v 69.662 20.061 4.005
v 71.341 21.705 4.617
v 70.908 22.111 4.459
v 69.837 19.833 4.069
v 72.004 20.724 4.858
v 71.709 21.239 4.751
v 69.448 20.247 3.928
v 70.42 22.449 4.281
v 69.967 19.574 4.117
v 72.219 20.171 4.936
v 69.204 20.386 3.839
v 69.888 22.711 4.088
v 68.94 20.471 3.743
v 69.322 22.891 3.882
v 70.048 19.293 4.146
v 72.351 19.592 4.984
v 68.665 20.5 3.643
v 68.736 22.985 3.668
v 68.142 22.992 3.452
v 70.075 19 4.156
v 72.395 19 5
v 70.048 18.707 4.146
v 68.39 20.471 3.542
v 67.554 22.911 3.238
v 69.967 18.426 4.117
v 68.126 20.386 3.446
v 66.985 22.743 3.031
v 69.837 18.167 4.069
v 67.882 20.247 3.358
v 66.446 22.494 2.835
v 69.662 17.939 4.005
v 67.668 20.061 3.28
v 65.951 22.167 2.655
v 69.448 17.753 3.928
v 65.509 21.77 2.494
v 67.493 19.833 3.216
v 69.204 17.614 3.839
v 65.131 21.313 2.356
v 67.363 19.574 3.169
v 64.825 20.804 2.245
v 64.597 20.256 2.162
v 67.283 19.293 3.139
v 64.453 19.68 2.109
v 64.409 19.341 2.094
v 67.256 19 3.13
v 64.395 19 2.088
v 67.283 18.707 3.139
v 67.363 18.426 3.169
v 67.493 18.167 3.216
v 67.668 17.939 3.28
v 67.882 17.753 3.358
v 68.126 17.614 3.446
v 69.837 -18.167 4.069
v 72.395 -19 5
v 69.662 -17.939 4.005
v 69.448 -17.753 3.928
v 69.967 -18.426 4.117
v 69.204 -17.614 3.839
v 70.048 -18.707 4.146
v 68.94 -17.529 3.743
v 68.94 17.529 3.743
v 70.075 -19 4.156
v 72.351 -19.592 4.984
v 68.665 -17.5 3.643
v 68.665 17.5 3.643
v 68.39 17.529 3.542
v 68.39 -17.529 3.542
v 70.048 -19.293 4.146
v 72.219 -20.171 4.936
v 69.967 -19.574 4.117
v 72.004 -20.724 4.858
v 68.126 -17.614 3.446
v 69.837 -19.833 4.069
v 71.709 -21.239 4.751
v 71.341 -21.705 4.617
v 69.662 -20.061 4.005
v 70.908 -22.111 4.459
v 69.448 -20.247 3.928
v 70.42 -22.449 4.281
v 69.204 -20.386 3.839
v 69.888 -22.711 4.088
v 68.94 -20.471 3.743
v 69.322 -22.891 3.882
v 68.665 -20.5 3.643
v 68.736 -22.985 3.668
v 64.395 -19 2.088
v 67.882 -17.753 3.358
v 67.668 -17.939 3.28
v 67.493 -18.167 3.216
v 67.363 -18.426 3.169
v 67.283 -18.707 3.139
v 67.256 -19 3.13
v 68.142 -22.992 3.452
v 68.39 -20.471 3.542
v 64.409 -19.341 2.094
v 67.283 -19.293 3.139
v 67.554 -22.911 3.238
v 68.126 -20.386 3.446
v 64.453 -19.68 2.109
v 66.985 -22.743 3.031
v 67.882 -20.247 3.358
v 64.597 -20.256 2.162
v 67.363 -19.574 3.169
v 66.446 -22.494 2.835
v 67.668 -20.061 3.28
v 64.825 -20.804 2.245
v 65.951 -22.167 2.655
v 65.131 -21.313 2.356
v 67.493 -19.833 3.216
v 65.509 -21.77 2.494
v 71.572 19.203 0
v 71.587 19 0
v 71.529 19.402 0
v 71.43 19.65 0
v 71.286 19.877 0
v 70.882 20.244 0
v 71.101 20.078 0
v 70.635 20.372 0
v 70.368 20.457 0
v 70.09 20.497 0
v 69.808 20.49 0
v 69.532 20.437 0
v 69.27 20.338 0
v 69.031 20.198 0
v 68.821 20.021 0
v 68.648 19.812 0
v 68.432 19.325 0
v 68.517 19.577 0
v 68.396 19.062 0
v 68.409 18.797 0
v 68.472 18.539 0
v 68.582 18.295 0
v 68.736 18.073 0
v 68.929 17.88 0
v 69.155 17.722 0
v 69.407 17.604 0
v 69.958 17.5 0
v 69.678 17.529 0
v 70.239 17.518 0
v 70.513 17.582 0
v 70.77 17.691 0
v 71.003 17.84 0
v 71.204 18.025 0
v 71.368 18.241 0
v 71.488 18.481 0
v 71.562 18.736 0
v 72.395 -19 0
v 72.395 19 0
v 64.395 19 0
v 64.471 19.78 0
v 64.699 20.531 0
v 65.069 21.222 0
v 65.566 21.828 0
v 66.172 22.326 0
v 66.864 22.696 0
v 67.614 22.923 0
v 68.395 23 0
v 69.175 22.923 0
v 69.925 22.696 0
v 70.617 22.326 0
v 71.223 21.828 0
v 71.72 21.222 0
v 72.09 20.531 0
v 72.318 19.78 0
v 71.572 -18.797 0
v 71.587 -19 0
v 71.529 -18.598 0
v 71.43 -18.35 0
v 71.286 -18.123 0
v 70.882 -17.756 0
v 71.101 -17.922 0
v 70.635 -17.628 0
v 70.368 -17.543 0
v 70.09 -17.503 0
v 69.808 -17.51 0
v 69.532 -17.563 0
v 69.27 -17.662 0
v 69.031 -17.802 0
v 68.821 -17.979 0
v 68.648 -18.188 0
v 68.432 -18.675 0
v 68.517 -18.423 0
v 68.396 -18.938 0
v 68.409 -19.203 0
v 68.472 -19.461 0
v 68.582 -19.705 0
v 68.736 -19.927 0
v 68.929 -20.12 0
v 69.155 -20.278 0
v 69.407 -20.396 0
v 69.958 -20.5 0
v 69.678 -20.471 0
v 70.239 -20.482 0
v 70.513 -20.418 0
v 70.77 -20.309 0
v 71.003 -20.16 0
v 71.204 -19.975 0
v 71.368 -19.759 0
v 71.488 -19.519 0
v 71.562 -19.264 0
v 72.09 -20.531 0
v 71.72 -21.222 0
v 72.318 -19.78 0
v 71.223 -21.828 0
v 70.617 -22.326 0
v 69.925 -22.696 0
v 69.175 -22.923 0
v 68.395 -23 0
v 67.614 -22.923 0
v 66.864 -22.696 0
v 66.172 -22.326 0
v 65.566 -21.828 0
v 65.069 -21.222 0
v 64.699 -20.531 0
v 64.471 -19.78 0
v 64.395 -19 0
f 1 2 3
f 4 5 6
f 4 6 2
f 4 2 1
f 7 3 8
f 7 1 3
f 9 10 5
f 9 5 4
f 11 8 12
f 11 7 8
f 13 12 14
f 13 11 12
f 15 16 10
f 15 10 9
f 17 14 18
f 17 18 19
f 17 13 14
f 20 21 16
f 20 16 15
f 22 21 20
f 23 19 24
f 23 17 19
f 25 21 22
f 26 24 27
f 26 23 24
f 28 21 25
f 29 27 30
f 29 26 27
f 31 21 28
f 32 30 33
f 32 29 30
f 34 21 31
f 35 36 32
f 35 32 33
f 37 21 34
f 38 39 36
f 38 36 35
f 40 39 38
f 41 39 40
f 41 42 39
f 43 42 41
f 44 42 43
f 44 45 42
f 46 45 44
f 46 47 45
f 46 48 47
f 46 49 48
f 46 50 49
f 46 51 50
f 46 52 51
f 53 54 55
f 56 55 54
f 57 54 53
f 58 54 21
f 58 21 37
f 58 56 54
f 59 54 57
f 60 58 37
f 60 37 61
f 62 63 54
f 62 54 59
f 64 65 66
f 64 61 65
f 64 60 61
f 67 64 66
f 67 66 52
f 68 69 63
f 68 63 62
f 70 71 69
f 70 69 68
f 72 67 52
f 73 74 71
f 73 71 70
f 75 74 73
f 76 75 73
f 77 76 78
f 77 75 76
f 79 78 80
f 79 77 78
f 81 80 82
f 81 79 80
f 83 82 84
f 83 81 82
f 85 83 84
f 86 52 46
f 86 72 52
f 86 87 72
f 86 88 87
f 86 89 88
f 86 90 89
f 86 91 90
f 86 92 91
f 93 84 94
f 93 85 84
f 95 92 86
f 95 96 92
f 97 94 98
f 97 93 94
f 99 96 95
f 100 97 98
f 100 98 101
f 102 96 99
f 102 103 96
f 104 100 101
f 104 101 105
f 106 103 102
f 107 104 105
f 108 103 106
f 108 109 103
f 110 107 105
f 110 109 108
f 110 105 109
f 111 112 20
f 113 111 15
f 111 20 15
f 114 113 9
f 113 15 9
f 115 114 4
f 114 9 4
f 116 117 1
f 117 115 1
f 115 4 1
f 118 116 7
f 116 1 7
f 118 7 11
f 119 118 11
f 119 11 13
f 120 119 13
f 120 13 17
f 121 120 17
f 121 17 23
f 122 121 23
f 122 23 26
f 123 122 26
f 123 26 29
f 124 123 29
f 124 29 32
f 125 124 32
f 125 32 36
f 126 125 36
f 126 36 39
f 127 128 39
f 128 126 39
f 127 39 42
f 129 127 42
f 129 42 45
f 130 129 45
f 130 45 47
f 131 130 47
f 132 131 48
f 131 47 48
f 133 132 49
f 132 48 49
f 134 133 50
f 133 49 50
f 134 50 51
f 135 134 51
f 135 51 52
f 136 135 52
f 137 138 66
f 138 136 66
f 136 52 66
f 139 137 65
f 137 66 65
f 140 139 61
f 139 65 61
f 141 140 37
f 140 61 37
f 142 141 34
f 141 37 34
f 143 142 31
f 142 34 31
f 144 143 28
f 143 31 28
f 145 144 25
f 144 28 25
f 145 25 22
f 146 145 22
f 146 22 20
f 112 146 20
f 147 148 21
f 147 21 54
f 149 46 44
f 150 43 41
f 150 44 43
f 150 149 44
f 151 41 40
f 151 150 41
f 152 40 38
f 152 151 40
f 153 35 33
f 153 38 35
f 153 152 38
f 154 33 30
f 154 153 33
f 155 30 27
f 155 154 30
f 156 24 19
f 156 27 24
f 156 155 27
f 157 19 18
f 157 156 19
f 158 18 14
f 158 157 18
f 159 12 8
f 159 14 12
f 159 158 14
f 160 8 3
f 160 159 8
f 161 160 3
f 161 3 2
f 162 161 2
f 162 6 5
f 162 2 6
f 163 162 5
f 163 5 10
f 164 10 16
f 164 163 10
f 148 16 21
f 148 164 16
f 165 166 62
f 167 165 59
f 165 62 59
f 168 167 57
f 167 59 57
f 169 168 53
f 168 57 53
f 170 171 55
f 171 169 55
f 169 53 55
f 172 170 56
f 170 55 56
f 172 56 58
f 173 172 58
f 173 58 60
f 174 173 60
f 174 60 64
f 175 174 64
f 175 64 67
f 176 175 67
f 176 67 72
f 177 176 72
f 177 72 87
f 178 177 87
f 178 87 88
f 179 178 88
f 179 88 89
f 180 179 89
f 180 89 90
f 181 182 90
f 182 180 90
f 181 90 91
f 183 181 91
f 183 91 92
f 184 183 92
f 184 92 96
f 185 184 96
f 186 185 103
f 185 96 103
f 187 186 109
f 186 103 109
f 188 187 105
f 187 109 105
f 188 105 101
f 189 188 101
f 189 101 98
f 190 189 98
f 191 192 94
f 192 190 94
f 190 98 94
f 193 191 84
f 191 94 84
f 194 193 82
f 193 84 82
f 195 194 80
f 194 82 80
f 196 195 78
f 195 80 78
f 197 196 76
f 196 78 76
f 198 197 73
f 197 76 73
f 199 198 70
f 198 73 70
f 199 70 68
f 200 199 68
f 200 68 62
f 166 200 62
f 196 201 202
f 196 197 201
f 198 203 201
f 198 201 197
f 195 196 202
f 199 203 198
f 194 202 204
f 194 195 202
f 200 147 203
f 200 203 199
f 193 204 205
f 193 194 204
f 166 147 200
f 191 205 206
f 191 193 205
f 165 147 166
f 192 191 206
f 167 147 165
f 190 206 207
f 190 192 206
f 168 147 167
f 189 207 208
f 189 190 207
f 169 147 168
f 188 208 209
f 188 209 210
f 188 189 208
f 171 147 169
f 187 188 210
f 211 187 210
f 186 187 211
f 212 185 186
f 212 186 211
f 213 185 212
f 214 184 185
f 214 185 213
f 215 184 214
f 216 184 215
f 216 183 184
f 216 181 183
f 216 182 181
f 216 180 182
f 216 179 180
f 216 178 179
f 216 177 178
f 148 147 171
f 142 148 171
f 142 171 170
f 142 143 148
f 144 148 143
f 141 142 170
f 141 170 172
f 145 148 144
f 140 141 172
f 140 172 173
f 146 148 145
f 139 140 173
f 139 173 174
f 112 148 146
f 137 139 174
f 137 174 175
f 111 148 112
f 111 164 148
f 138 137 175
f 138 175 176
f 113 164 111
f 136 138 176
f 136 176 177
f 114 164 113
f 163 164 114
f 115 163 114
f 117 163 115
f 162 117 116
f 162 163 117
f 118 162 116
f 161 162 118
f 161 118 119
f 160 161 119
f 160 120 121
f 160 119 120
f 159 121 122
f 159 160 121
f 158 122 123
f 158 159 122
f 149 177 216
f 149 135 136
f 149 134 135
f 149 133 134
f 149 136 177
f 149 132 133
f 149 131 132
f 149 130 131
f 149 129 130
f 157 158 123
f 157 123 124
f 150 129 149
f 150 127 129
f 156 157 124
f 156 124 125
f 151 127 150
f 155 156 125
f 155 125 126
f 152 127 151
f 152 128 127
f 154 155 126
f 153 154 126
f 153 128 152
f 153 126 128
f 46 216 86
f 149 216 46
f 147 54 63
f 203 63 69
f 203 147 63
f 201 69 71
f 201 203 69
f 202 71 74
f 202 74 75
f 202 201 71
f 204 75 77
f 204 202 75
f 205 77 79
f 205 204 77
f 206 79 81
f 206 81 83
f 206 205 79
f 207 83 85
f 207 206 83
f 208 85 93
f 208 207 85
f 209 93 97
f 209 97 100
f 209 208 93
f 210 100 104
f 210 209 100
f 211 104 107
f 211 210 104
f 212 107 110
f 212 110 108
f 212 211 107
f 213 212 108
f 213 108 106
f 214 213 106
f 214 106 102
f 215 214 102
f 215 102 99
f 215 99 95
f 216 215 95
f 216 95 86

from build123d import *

# Parameters (mm, degrees)
BOSS_EXTRUDE1_DEPTH     = 5
CUT_EXTRUDE1_DEPTH      = 24
CUT_EXTRUDE1_DEPTH_BACK = 24
SKETCH3_R               = 1.5
CUT_EXTRUDE2_DEPTH      = 91


with BuildPart() as part:
    # Sketch1 → Boss-Extrude1 (new body)
    with BuildSketch(Plane.XY):
        with BuildLine():
            Line((72.394590039, 19), (72.394590039, -19))
            ThreePointArc((72.394590039, -19), (68.394590039, -23), (64.394590039, -19))
            Line((64.394590039, -19), (64.394590039, 19))
            ThreePointArc((64.394590039, 19), (68.394590039, 23), (72.394590039, 19))
        make_face()
    extrude(amount=BOSS_EXTRUDE1_DEPTH)

    # Sketch2 → Cut-Extrude1 (cut, two sides)
    with BuildSketch(Plane(origin=(0, 0, 0), x_dir=(1, 0, 0), z_dir=(0, 1, 0))) as cut_extrude1_sk:
        Polygon((72.394590039, -5), (64.394590039, -2.088238126), (64.394590039, -5), align=None)
    extrude(amount=CUT_EXTRUDE1_DEPTH, mode=Mode.SUBTRACT)
    extrude(cut_extrude1_sk.sketch, amount=-CUT_EXTRUDE1_DEPTH_BACK, mode=Mode.SUBTRACT)

    # Sketch3 → Cut-Extrude2 (cut)
    with BuildSketch(Plane(origin=(6.86158929, 0, -18.852061635), x_dir=(0.939692621, 0, 0.342020143), z_dir=(-0.342020143, 0, 0.939692621))):
        with Locations((65.769891562, 19)):
            Circle(SKETCH3_R)
        with Locations((65.769891562, -19)):
            Circle(SKETCH3_R)
    extrude(amount=-CUT_EXTRUDE2_DEPTH, mode=Mode.SUBTRACT)


solid = part.part
